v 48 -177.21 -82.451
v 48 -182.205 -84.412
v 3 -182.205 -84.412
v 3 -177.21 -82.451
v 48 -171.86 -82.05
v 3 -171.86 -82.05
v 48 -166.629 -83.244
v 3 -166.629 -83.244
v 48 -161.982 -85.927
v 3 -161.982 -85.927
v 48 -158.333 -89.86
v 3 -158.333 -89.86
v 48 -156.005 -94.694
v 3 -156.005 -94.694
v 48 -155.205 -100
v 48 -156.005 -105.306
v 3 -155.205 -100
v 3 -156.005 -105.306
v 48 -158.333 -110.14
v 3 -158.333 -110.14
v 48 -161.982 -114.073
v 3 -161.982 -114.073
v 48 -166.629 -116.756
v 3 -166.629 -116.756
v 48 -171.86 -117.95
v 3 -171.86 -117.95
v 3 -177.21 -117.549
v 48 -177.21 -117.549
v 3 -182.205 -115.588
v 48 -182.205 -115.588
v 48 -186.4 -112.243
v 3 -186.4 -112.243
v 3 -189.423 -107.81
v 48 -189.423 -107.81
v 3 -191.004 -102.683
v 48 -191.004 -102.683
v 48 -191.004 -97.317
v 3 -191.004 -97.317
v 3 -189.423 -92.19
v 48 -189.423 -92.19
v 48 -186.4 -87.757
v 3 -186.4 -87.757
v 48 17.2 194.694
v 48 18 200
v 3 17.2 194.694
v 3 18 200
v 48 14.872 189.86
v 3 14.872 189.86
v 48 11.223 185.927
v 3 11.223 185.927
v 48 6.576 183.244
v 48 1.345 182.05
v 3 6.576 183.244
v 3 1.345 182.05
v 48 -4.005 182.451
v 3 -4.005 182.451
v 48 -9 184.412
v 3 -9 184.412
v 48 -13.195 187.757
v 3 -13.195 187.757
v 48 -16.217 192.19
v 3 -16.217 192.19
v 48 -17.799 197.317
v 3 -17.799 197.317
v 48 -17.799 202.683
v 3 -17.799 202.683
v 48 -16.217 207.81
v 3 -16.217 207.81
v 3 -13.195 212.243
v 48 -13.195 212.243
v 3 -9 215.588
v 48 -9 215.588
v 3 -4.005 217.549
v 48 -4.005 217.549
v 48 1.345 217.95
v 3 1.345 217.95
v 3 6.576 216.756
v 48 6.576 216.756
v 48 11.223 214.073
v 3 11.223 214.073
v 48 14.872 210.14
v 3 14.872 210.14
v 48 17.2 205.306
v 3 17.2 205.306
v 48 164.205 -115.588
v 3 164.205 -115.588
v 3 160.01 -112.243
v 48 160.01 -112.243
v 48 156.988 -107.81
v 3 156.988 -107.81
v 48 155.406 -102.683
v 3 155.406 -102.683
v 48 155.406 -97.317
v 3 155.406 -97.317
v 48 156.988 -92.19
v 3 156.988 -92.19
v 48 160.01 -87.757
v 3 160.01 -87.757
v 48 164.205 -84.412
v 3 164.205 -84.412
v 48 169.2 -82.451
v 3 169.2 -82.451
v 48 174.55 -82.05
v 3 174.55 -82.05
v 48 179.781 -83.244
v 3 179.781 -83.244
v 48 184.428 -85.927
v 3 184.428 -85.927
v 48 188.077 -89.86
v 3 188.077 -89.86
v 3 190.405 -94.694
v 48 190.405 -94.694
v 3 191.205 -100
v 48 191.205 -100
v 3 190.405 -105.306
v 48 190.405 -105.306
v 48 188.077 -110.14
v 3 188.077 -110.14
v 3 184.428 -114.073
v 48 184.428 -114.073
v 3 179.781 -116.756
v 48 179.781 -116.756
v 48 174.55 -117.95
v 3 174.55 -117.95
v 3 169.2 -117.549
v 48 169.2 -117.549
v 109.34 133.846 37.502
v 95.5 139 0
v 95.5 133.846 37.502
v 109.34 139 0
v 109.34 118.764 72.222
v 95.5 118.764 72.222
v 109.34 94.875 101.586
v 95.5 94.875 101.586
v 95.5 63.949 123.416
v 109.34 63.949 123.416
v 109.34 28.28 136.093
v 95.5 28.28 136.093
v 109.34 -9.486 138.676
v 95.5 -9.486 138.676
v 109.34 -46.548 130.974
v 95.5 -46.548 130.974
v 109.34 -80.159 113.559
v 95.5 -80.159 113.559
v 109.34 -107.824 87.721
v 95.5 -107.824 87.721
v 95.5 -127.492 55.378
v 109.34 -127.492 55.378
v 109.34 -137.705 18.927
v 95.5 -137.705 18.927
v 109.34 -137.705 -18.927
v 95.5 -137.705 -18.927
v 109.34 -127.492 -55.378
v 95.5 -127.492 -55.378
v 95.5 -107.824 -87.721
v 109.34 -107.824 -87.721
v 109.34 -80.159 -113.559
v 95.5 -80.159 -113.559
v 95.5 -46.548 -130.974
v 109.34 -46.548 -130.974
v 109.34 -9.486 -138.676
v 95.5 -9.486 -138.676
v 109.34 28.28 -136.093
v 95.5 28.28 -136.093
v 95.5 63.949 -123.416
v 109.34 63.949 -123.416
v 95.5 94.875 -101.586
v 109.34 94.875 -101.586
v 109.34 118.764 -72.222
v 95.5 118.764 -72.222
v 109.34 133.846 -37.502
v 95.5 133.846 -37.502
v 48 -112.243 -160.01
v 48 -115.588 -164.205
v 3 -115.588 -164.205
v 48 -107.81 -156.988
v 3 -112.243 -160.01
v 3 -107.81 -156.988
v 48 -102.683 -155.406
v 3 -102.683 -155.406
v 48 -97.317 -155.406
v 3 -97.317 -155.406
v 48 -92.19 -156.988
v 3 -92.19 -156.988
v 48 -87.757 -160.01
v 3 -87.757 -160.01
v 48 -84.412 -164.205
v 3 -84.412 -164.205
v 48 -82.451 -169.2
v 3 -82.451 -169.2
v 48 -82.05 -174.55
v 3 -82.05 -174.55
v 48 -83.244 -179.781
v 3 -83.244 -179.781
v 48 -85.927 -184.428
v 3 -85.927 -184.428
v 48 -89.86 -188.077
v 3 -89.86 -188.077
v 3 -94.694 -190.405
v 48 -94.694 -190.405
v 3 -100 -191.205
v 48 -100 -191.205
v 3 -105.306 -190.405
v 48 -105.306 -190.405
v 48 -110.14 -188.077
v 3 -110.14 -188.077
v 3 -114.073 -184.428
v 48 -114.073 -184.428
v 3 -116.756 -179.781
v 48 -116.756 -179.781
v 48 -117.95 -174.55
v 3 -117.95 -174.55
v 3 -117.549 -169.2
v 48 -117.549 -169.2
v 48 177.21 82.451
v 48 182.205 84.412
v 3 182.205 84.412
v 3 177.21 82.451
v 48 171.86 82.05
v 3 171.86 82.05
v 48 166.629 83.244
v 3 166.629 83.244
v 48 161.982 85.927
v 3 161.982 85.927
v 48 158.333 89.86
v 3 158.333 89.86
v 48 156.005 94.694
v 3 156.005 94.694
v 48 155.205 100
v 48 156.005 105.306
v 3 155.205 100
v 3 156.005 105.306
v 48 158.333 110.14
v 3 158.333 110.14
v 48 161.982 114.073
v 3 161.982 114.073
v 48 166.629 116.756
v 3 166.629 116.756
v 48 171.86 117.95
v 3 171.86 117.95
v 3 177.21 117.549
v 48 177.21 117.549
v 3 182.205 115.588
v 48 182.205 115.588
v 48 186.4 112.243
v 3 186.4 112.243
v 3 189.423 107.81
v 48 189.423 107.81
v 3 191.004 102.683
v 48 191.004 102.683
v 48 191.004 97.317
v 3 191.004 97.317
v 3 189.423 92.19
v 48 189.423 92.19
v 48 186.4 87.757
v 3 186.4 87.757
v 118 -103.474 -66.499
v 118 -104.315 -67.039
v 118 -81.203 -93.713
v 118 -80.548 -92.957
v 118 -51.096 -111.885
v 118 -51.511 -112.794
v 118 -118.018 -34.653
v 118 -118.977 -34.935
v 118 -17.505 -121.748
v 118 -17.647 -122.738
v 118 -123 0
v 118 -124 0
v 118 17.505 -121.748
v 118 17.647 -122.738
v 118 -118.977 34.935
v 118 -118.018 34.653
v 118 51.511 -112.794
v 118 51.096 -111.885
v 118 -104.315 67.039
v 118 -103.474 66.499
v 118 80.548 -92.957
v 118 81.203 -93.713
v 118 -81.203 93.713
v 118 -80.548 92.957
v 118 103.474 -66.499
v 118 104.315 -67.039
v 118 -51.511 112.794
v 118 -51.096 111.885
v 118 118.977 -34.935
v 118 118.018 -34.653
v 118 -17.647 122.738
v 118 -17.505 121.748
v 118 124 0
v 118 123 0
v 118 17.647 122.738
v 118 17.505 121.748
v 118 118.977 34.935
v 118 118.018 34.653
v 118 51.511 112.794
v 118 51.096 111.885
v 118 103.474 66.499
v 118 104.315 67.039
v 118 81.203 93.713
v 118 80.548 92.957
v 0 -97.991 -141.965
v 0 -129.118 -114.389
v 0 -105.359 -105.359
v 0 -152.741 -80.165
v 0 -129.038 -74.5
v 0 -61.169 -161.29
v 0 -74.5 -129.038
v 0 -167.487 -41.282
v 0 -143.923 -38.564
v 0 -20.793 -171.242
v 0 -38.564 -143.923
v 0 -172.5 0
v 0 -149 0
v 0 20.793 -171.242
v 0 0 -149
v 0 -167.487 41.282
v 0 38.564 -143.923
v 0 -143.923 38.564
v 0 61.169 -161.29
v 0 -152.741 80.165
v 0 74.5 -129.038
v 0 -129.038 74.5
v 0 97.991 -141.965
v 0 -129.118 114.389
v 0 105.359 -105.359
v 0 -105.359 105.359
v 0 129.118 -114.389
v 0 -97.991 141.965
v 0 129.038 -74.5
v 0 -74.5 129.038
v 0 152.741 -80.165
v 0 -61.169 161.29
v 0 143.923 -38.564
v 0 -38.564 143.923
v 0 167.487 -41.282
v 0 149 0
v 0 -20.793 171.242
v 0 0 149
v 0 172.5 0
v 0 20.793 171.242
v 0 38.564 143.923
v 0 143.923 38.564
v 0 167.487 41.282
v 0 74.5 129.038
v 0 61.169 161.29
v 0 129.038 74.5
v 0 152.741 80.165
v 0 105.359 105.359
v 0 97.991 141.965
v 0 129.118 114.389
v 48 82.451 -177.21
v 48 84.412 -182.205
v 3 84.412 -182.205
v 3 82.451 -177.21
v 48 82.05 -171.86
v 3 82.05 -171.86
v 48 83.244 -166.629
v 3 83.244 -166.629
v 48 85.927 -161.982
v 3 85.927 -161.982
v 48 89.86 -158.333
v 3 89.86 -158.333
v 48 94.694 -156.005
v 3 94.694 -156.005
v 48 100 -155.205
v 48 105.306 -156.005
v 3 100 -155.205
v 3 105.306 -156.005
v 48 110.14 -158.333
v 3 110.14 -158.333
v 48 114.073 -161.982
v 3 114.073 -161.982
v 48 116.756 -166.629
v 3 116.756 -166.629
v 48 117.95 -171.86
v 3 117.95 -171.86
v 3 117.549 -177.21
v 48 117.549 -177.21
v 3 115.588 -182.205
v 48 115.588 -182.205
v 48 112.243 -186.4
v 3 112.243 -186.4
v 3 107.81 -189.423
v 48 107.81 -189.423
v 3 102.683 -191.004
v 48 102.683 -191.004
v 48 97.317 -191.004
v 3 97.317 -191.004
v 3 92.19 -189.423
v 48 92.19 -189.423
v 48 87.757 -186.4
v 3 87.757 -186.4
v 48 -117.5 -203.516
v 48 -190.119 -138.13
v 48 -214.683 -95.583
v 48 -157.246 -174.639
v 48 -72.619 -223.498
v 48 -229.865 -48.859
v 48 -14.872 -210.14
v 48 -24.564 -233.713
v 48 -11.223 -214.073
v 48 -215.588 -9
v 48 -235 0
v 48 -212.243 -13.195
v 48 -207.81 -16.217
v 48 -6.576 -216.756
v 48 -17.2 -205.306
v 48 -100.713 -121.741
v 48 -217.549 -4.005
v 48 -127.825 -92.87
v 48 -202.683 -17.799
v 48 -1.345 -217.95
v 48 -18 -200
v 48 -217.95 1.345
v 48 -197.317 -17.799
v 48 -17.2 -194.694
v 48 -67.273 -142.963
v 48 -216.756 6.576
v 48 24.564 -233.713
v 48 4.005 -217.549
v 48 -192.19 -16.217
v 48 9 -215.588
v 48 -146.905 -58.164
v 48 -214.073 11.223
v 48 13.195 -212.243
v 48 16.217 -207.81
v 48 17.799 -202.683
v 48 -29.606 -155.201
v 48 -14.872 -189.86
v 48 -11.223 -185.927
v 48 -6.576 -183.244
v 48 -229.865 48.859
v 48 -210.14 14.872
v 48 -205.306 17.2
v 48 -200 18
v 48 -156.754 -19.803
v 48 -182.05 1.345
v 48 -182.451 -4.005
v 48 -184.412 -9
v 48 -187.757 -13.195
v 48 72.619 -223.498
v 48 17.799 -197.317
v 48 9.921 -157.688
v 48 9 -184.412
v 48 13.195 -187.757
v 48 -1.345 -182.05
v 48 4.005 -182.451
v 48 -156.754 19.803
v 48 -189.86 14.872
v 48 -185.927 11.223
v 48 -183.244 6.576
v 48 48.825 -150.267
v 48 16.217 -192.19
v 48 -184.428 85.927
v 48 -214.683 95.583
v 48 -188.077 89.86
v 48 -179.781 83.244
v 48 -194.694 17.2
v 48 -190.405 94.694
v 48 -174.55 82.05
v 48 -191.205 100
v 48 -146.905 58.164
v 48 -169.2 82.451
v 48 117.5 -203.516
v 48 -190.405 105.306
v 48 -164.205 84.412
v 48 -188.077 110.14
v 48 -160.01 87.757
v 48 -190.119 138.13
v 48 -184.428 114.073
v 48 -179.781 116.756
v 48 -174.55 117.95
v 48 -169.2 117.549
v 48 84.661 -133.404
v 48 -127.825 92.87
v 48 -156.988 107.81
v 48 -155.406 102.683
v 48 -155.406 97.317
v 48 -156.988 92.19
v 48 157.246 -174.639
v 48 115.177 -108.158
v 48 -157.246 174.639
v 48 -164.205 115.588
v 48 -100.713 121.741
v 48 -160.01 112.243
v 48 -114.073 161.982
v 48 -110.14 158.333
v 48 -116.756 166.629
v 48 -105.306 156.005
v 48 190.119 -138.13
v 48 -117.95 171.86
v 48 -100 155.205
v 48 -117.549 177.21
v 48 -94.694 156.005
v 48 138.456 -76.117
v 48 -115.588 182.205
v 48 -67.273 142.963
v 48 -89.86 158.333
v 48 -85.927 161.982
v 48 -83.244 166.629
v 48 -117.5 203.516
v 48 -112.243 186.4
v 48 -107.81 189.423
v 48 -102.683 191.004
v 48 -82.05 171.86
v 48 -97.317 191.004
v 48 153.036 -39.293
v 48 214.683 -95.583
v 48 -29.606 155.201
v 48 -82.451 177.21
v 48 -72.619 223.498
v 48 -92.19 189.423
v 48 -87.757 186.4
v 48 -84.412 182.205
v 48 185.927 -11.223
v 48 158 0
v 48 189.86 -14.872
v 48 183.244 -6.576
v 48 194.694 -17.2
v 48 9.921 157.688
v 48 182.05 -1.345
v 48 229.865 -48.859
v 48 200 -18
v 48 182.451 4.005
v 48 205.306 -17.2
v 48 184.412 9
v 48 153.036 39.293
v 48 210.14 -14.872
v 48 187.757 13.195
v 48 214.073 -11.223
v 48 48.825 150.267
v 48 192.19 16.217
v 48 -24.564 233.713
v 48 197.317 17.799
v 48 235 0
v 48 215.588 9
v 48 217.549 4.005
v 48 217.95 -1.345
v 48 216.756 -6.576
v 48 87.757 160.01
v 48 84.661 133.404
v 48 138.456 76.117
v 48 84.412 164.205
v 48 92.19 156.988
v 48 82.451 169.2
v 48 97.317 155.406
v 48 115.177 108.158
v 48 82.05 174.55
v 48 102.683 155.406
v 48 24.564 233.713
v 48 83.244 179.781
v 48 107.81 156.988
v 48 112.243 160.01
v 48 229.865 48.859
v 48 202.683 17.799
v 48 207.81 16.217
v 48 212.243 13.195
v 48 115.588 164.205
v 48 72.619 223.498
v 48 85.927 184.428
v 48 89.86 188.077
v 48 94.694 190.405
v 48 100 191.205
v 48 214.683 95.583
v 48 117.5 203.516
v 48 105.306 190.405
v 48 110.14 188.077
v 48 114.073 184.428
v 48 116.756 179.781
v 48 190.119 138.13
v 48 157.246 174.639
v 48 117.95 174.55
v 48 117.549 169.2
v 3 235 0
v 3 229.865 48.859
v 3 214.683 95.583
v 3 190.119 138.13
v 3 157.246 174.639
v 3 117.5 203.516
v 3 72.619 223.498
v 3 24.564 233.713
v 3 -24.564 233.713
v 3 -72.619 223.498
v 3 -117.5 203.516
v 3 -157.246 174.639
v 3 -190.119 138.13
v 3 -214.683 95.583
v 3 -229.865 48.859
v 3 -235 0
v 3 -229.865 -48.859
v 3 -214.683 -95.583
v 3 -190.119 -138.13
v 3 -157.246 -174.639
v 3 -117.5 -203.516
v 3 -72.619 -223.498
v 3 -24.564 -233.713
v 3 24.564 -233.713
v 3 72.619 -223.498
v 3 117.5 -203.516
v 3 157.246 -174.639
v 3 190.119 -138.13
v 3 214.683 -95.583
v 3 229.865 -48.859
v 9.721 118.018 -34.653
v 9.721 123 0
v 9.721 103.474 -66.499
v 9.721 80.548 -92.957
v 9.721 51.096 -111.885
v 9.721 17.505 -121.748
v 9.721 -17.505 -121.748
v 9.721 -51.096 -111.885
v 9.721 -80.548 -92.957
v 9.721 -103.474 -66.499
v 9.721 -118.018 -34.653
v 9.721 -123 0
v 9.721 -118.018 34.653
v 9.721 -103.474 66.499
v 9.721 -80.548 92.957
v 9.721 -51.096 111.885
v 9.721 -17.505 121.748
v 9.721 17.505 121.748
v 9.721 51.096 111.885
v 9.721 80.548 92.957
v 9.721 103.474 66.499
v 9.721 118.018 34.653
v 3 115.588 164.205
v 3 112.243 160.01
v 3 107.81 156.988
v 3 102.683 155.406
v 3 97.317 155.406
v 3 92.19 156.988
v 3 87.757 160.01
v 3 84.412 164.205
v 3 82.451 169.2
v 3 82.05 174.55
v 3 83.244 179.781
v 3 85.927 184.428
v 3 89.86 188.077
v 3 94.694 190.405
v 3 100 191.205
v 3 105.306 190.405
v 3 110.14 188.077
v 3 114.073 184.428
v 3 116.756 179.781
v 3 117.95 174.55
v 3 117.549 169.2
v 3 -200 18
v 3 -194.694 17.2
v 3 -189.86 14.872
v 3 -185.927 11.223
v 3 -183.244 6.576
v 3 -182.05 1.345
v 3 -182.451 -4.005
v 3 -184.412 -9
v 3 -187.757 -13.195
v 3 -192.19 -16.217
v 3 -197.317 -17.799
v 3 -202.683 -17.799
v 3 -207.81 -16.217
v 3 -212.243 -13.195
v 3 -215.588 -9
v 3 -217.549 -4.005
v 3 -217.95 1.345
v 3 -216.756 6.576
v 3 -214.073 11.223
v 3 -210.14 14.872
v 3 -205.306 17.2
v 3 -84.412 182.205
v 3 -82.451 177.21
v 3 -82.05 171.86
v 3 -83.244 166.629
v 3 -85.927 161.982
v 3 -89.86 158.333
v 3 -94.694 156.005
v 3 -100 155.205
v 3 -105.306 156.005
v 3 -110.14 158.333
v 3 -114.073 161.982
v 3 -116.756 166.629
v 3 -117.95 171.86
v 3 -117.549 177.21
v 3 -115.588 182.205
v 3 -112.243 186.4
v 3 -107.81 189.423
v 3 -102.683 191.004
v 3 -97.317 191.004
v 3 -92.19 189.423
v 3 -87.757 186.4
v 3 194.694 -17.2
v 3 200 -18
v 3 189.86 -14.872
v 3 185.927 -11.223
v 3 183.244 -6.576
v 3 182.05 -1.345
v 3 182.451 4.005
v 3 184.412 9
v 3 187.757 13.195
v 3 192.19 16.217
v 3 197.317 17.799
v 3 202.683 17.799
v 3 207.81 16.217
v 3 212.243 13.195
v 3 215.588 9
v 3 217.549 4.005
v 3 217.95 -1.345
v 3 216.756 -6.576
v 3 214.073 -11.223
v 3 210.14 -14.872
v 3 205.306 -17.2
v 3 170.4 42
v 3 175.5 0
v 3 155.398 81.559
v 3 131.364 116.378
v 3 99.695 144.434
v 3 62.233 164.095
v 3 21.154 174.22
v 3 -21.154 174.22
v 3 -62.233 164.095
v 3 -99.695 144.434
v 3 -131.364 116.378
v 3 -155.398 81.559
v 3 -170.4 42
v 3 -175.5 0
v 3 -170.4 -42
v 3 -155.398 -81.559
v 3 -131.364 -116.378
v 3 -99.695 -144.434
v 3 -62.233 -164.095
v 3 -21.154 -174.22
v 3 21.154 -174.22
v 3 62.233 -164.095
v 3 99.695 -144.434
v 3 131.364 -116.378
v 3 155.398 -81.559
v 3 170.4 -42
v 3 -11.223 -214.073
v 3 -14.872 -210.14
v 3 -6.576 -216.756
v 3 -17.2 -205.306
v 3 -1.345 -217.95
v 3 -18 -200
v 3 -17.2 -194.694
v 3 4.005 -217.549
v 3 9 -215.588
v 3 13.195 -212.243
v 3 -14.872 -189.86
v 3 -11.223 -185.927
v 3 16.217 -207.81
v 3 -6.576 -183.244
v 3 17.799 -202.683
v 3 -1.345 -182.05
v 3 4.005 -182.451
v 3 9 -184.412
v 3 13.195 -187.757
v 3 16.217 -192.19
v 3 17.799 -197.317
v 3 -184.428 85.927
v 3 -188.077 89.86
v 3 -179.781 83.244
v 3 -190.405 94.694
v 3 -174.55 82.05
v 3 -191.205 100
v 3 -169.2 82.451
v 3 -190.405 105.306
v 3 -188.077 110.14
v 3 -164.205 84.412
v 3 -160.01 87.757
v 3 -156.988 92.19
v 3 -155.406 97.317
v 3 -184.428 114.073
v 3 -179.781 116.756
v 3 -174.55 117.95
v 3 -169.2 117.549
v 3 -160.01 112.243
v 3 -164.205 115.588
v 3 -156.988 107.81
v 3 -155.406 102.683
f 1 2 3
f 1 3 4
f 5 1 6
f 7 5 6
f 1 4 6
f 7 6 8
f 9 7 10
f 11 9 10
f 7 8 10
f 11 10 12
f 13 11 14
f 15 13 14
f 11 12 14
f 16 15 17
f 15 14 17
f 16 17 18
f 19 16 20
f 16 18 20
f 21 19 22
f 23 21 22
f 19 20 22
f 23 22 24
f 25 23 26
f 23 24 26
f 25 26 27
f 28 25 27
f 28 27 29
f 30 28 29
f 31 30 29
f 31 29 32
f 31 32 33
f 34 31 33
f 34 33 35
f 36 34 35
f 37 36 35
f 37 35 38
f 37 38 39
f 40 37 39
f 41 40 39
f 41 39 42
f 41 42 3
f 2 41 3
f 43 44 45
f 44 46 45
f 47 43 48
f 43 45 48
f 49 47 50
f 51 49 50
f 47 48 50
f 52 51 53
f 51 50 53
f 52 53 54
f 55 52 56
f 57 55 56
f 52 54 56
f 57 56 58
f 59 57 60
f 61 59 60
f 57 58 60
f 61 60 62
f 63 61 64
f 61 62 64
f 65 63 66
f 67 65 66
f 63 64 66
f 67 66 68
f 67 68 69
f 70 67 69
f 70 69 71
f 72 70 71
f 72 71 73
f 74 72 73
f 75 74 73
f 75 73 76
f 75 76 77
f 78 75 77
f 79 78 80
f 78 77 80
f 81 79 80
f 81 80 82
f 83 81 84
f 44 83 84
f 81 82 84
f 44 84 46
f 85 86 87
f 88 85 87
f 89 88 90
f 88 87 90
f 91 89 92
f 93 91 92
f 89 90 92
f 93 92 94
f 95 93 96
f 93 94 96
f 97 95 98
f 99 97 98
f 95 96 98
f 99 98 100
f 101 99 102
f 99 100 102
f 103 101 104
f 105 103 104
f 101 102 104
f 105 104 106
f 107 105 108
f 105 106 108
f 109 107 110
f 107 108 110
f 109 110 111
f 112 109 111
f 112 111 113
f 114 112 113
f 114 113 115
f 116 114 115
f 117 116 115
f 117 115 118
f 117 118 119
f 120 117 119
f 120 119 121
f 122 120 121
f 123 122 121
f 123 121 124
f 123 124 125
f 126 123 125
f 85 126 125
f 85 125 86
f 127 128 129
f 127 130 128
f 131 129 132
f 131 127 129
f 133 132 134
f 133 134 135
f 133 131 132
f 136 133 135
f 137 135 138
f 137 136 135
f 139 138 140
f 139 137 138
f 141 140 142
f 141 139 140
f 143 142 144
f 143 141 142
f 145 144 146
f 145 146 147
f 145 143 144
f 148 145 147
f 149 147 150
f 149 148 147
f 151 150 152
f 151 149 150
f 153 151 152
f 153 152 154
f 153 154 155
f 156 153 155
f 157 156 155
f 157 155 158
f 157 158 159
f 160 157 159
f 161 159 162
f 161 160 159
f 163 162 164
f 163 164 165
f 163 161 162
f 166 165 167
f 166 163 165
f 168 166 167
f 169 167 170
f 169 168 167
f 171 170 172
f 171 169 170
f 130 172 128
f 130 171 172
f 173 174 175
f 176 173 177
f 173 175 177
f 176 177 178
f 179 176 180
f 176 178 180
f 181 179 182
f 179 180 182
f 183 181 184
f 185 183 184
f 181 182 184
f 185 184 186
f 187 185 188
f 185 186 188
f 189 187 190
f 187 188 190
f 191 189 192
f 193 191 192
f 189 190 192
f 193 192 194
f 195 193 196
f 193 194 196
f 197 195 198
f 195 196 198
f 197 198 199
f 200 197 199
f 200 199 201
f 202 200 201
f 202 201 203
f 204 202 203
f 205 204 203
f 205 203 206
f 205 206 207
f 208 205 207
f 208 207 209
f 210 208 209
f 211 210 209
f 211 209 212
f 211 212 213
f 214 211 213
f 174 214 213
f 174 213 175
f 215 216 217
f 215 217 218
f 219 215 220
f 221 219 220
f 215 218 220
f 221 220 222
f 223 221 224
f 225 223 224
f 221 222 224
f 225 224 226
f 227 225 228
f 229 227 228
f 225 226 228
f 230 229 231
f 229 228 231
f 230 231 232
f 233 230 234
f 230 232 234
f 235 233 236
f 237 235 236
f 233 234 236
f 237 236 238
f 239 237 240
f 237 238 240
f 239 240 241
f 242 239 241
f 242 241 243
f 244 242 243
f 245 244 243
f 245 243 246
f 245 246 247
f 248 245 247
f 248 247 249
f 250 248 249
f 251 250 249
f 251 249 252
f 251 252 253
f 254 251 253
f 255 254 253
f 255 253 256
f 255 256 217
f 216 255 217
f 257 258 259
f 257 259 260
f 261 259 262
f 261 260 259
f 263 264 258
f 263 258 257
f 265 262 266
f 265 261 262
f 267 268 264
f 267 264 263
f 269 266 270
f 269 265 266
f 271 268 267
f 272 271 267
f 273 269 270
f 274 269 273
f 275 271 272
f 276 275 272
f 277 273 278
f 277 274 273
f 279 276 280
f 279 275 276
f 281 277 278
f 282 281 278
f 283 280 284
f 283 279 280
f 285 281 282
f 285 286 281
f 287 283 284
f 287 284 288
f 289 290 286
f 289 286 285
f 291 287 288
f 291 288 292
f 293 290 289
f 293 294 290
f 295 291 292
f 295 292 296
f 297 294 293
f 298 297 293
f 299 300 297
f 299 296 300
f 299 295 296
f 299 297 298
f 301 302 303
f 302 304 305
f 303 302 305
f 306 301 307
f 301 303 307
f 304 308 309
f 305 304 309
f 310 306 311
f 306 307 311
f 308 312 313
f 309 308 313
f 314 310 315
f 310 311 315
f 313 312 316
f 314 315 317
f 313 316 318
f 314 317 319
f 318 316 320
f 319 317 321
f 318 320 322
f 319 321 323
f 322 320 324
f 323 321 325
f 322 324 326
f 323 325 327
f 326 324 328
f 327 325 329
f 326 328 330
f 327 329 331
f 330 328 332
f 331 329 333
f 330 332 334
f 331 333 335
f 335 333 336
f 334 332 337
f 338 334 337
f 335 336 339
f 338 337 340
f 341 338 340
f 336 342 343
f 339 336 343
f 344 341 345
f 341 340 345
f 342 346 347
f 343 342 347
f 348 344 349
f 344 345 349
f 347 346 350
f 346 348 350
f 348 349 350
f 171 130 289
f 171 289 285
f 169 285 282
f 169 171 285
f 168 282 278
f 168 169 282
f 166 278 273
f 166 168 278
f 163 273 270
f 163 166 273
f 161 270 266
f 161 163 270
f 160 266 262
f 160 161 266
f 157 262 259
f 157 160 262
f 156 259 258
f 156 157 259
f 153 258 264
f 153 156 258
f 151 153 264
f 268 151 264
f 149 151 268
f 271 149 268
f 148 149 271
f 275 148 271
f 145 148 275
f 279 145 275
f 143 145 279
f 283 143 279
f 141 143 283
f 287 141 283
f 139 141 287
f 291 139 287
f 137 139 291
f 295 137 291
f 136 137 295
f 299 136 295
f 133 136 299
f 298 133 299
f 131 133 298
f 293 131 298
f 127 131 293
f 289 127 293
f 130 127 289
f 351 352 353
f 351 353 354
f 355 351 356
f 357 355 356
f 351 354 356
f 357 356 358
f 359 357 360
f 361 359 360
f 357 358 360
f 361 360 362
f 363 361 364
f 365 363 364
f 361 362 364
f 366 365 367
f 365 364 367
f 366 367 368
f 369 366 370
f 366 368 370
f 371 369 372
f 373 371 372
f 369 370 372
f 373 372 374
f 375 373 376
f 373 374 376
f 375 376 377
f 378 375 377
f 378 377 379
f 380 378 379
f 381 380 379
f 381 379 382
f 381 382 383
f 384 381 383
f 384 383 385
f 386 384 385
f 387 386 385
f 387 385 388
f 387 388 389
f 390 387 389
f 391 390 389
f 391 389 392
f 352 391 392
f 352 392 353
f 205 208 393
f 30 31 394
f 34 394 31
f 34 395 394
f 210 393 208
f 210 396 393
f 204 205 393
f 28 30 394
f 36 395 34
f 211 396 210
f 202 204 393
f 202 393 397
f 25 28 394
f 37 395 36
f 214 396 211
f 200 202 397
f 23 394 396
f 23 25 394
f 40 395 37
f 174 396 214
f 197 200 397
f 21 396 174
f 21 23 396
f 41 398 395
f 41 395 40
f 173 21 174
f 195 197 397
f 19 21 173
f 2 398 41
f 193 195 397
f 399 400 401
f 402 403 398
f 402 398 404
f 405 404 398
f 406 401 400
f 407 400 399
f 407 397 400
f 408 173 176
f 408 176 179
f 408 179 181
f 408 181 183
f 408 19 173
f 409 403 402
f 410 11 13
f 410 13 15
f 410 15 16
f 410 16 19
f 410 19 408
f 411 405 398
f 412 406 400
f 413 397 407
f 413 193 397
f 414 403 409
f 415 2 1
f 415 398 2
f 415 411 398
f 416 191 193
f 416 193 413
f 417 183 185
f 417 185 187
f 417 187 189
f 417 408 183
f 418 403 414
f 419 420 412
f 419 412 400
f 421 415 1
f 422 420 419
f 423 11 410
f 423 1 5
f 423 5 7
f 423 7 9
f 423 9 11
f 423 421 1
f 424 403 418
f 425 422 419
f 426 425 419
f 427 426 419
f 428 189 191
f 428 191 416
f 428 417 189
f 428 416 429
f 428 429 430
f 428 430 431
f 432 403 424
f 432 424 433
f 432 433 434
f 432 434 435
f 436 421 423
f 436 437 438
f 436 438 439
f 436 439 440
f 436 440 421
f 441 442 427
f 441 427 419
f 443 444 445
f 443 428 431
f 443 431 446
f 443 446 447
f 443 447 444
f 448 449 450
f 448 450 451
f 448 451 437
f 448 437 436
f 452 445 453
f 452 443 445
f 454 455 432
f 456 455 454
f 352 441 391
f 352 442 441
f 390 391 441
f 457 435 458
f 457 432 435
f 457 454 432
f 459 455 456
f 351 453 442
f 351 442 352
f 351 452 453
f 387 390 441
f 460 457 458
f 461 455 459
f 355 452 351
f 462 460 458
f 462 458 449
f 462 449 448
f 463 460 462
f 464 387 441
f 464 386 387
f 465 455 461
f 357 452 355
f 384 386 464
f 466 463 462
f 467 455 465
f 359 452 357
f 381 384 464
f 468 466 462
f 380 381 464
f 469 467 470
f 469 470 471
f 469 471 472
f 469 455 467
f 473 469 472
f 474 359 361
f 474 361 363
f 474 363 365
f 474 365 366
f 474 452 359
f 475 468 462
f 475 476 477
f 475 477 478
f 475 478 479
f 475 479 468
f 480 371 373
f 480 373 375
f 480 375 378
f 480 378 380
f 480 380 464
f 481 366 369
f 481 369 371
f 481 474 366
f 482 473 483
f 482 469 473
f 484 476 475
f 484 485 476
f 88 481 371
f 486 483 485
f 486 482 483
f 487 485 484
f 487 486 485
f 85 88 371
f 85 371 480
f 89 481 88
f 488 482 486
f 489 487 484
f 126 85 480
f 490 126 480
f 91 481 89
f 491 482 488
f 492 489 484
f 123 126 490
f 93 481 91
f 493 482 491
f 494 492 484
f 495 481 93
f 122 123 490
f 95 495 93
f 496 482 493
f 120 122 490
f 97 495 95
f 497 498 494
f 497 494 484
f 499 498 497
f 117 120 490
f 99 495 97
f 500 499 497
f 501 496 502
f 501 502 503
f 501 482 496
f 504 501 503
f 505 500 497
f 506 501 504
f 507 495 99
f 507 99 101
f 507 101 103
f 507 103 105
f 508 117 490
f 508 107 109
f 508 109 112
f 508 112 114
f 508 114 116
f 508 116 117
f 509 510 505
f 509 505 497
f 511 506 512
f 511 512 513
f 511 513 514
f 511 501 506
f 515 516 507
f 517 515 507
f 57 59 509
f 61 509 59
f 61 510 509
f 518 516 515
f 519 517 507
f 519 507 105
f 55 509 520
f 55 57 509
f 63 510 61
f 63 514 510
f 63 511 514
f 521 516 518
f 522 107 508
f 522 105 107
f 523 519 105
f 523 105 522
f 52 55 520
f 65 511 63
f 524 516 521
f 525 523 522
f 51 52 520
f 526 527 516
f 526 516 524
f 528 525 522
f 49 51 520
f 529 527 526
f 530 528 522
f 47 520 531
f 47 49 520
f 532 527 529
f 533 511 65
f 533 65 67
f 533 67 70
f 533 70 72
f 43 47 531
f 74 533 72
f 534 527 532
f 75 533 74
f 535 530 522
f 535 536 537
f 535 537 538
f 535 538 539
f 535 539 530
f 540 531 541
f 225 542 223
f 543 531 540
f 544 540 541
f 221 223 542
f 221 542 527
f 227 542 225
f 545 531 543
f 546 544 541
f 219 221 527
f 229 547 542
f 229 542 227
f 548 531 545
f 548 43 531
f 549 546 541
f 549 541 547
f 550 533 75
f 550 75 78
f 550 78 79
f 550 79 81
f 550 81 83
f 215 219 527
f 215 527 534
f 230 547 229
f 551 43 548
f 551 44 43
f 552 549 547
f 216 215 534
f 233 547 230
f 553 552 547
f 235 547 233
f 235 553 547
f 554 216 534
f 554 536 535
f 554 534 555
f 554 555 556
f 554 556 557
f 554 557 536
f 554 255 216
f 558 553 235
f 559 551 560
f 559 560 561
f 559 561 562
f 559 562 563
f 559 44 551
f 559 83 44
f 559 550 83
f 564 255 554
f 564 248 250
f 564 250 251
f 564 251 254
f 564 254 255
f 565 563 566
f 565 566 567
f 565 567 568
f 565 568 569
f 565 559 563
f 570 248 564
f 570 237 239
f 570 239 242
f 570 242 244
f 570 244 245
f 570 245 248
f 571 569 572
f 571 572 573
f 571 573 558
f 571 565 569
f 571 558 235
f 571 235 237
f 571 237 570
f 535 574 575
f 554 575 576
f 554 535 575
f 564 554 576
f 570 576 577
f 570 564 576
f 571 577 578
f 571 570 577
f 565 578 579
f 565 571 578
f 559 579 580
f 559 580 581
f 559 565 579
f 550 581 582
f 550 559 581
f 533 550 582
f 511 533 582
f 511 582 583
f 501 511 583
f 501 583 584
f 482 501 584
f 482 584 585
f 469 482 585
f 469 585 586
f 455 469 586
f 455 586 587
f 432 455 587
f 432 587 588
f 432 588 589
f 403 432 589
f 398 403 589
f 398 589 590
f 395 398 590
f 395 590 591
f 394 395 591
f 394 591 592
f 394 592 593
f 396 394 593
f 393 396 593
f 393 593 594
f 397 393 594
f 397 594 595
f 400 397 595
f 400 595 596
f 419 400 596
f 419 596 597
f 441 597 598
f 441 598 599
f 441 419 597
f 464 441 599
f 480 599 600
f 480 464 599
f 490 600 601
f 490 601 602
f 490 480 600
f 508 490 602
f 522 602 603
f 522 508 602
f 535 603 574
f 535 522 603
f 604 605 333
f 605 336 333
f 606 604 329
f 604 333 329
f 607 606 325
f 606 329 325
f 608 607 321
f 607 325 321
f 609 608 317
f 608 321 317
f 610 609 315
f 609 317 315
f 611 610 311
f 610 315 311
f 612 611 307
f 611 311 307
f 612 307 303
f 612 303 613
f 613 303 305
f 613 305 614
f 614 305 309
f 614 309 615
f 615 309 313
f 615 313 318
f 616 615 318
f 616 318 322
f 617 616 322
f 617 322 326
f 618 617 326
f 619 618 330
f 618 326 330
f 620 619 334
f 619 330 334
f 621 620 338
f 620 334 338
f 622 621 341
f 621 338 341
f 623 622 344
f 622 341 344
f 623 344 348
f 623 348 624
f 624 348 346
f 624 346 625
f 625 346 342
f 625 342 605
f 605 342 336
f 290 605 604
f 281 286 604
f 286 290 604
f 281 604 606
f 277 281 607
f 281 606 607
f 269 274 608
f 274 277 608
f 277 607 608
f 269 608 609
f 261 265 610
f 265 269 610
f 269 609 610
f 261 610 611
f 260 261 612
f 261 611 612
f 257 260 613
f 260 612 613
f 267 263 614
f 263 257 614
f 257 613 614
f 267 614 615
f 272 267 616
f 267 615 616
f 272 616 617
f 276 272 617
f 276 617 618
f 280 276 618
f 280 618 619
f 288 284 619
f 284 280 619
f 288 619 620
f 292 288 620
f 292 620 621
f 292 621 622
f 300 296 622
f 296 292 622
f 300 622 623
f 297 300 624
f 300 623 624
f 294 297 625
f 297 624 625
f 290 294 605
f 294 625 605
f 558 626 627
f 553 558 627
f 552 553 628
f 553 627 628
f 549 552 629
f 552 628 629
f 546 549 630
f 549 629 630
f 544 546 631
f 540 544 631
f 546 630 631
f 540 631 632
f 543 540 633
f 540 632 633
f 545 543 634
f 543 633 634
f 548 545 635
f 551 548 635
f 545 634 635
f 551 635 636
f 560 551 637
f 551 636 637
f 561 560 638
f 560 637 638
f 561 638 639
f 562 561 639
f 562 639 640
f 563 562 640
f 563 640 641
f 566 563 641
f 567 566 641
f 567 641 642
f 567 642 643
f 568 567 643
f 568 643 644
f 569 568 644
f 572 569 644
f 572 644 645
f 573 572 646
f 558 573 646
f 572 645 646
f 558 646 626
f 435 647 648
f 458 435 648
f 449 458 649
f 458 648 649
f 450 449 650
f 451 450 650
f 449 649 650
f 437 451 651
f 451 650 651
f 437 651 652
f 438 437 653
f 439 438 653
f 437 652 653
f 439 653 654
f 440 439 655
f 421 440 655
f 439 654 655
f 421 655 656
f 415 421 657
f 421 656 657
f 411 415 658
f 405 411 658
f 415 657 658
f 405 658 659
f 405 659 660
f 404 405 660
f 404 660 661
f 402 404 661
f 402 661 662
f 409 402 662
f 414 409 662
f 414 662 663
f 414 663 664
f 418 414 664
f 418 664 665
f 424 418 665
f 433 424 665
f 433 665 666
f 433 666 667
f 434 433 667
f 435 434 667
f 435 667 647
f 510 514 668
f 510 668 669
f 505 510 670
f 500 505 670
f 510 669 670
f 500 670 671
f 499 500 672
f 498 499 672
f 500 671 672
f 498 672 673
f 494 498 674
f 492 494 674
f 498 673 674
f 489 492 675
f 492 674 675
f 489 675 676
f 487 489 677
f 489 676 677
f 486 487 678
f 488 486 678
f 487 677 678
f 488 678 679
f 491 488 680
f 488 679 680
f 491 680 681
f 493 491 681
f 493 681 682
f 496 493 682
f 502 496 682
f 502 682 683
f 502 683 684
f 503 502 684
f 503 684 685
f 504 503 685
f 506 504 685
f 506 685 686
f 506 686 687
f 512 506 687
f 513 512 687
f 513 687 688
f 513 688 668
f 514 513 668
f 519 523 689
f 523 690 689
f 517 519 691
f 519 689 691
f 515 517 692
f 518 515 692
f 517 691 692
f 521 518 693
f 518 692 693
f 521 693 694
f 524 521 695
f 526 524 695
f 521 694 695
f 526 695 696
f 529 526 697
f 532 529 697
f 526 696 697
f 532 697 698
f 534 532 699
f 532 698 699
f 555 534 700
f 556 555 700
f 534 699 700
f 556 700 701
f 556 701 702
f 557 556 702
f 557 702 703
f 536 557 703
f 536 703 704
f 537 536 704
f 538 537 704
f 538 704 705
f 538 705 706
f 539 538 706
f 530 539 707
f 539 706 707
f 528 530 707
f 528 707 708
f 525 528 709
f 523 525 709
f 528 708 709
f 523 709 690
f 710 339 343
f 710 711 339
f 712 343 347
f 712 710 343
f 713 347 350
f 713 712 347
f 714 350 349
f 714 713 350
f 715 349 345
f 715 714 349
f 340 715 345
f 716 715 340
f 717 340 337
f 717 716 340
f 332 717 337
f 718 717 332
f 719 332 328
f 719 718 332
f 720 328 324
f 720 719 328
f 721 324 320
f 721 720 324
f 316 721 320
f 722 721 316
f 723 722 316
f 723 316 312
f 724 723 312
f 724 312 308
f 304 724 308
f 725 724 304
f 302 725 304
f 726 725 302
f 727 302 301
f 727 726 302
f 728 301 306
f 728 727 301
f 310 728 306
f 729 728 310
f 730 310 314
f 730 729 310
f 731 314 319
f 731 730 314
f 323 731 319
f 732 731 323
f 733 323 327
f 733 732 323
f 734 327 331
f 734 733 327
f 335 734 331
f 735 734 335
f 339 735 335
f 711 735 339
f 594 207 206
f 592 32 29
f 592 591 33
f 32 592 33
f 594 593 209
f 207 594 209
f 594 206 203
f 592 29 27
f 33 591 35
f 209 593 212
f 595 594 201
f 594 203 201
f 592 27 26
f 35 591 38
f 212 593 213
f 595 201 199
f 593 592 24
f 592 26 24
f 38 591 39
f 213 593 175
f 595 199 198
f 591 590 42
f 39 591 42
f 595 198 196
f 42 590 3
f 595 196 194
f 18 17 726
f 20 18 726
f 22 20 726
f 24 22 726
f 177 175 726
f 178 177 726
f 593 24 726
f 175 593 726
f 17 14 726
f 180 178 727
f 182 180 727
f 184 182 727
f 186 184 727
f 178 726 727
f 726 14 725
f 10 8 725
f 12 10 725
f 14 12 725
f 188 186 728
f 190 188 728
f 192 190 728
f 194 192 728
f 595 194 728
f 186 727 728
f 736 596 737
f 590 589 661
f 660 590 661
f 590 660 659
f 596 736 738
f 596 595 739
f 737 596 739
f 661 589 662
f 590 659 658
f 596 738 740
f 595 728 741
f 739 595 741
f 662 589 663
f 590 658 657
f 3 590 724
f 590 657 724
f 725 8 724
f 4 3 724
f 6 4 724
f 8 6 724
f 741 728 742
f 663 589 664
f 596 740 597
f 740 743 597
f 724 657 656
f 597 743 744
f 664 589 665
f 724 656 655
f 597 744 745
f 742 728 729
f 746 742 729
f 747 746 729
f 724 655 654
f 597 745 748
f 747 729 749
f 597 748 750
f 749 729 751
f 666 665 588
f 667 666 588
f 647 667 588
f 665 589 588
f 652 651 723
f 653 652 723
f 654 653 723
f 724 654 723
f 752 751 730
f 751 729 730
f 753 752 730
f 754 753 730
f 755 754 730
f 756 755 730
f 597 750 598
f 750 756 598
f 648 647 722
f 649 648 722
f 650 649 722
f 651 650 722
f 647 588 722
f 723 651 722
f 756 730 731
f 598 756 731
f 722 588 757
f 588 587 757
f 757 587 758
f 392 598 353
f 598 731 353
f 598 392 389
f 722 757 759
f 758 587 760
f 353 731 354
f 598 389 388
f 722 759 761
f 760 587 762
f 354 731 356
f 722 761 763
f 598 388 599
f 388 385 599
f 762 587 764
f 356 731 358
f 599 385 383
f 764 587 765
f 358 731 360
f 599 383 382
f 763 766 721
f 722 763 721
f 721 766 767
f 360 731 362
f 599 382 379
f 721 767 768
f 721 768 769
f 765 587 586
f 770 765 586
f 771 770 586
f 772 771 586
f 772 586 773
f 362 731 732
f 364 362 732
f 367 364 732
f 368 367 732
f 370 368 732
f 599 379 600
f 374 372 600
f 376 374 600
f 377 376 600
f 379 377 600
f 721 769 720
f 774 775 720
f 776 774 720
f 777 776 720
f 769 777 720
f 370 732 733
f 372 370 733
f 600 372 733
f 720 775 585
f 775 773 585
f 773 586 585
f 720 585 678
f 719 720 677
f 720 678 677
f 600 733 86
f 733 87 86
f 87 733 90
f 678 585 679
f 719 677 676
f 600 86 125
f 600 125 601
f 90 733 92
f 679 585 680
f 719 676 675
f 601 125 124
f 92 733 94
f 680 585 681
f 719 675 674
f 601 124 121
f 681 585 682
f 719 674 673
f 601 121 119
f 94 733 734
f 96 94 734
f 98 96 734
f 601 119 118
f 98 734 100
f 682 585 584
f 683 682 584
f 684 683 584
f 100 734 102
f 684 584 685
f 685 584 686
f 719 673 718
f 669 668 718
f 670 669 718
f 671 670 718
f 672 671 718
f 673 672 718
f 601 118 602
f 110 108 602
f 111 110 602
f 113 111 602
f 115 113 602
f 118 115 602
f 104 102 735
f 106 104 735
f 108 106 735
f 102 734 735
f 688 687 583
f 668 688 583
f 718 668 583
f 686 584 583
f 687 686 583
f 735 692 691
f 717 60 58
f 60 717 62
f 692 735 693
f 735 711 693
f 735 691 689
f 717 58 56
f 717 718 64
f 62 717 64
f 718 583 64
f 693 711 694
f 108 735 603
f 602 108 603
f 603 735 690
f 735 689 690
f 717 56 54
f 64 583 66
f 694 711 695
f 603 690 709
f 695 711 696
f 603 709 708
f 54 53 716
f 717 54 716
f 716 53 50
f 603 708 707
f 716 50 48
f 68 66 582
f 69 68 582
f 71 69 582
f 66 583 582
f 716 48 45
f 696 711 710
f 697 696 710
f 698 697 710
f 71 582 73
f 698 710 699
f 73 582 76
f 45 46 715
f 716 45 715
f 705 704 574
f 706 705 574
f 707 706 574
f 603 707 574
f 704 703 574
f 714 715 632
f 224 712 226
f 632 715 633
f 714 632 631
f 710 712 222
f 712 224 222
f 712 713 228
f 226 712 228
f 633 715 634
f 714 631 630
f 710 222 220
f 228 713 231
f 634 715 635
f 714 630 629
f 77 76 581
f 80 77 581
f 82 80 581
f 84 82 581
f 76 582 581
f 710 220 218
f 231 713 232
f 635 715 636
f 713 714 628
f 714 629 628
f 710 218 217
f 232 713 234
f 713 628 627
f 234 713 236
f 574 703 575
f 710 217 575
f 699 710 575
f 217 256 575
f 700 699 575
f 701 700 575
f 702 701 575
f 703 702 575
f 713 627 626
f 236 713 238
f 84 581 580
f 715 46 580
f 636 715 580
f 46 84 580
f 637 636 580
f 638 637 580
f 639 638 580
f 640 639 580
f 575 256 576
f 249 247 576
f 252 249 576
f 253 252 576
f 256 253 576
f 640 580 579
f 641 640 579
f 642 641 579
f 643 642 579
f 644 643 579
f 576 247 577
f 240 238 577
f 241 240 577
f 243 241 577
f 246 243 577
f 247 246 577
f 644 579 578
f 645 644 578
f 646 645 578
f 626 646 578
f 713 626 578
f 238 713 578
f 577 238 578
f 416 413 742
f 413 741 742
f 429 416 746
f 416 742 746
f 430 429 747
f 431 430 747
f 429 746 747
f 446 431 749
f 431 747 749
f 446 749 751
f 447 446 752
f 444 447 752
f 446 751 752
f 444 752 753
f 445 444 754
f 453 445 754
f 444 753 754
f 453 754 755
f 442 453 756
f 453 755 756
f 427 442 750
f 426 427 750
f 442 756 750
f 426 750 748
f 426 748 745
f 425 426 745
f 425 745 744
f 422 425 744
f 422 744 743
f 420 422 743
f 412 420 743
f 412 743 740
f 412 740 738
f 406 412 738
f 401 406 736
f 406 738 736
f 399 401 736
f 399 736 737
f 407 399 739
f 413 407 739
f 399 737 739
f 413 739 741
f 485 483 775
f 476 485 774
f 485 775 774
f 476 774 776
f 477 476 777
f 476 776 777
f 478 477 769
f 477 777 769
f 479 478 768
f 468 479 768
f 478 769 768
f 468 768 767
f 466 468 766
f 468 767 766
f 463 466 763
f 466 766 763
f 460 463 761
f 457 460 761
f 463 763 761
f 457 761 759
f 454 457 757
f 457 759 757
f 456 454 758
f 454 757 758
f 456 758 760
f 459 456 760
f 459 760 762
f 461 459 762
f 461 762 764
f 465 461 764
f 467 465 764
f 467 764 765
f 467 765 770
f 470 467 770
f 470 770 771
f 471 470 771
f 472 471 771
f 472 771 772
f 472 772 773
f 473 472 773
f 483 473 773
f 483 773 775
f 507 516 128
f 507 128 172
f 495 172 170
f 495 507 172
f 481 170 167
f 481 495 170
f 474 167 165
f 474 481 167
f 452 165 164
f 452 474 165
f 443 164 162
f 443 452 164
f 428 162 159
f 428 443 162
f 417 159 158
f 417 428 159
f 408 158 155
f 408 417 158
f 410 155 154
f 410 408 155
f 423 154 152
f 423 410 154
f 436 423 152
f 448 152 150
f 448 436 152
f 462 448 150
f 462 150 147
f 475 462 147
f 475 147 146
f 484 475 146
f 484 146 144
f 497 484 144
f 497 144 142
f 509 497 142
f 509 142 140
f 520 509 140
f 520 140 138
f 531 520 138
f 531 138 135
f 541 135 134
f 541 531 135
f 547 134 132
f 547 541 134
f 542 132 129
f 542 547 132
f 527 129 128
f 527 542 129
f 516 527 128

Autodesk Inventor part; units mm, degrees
ref_plane "YZ Plane" through (0, 0, 0) normal (1, 0, 0) x (0, 1, 0)
ref_plane "XZ Plane" through (0, 0, 0) normal (0, 1, 0) x (-1, 0, 0)
ref_plane "XY Plane" through (0, 0, 0) normal (0, 0, 1) x (1, 0, 0)
sketch "Sketch1" plane through (0, 0, 0) normal (0, 0, 1) x (1, 0, 0)
  line L0 (3, 235) -> (48, 235)
  line L1 (48, 235) -> (48, 158)
  line L2 (3, 175.5) -> (3, 235)
  line L3 (-23.6, 0) -> (141.6, 0) projected
  line L4 (48, 158) -> (95.5, 139)
  line L5 (95.5, 139) -> (109.3397, 139)
  line L6 (118, 124) -> (118, 123)
  line L7 (118, 123) -> (9.721, 123)
  line L8 (3, 175.5) -> (0, 172.5)
  line L9 (0, 172.5) -> (0, 149)
  line L10 (118, 124) -> (109.3397, 139)
  line L11 (9.721, 123) -> (0, 149)
  point P0 (0, 0)
  point P1 (118, 139)
  dimension "d0" = 45
  dimension "d1" = 470
  dimension "d7" = 246
  dimension "d8" = 345
  dimension "d9" = 316
  dimension "d10" = 135
  dimension "d11" = 3
  dimension "d19" = 19
  dimension "d12" = 47.5
  dimension "d13" = 278
  dimension "d14" = 115
  dimension "d15" = 30
  dimension "d16" = 1
  dimension "d17" = 20.5
  dimension "d18" = 298
revolve "Revolution1" add sketch "Sketch1" angle 360 about axis through (-10, 0, 0) along (1, 0, 0)
sketch "Sketch2" plane through (0, 0, 0) normal (1, 0, 0) x (0, 1, 0)
  circle A0 centre (0, 200) radius 18
  line L0 (0, 44.8) -> (0, 25.2) construction
  line L1 (-9.8, 0) -> (9.8, 0) construction
  dimension "d2" = 36
  dimension "d3" = 400
extrude "Extrusion1" cut sketch "Sketch2" along normal through all both and the other way through all
pattern_circular "Circular Pattern1" count 12 over 360 about axis through (-10, 0, 0) along (1, 0, 0) of "Extrusion1"
equation "\"d2\" = d"
equation "\"d3\" = D1_"
equation "\"d0\" = b"
equation "\"d1\" = D_"
equation "\"d7\" = d1__"
equation "\"d8\" = D2_"
equation "\"d9\" = Dm"
equation "\"d11\" = h_"
equation "\"d12\" = 2.5 * d19"
equation "\"d13\" = Dn"
equation "\"d14\" = h4_"
equation "\"d18\" = D7_"
equation "\"b\" = 45"
equation "\"Dm\" = 316"
equation "\"D_\" = 470"
equation "\"D1_\" = 400"
equation "\"D2_\" = 345"
equation "\"d\" = 36"
equation "\"h_\" = 3"
equation "\"d1__\" = 246"
equation "\"h4_\" = 115"
equation "\"Dn\" = 278"
equation "\"D7_\" = 298"
properties part number "Flange 6-250-63-1 GOST 12821-80" material "Steel, Mild"
